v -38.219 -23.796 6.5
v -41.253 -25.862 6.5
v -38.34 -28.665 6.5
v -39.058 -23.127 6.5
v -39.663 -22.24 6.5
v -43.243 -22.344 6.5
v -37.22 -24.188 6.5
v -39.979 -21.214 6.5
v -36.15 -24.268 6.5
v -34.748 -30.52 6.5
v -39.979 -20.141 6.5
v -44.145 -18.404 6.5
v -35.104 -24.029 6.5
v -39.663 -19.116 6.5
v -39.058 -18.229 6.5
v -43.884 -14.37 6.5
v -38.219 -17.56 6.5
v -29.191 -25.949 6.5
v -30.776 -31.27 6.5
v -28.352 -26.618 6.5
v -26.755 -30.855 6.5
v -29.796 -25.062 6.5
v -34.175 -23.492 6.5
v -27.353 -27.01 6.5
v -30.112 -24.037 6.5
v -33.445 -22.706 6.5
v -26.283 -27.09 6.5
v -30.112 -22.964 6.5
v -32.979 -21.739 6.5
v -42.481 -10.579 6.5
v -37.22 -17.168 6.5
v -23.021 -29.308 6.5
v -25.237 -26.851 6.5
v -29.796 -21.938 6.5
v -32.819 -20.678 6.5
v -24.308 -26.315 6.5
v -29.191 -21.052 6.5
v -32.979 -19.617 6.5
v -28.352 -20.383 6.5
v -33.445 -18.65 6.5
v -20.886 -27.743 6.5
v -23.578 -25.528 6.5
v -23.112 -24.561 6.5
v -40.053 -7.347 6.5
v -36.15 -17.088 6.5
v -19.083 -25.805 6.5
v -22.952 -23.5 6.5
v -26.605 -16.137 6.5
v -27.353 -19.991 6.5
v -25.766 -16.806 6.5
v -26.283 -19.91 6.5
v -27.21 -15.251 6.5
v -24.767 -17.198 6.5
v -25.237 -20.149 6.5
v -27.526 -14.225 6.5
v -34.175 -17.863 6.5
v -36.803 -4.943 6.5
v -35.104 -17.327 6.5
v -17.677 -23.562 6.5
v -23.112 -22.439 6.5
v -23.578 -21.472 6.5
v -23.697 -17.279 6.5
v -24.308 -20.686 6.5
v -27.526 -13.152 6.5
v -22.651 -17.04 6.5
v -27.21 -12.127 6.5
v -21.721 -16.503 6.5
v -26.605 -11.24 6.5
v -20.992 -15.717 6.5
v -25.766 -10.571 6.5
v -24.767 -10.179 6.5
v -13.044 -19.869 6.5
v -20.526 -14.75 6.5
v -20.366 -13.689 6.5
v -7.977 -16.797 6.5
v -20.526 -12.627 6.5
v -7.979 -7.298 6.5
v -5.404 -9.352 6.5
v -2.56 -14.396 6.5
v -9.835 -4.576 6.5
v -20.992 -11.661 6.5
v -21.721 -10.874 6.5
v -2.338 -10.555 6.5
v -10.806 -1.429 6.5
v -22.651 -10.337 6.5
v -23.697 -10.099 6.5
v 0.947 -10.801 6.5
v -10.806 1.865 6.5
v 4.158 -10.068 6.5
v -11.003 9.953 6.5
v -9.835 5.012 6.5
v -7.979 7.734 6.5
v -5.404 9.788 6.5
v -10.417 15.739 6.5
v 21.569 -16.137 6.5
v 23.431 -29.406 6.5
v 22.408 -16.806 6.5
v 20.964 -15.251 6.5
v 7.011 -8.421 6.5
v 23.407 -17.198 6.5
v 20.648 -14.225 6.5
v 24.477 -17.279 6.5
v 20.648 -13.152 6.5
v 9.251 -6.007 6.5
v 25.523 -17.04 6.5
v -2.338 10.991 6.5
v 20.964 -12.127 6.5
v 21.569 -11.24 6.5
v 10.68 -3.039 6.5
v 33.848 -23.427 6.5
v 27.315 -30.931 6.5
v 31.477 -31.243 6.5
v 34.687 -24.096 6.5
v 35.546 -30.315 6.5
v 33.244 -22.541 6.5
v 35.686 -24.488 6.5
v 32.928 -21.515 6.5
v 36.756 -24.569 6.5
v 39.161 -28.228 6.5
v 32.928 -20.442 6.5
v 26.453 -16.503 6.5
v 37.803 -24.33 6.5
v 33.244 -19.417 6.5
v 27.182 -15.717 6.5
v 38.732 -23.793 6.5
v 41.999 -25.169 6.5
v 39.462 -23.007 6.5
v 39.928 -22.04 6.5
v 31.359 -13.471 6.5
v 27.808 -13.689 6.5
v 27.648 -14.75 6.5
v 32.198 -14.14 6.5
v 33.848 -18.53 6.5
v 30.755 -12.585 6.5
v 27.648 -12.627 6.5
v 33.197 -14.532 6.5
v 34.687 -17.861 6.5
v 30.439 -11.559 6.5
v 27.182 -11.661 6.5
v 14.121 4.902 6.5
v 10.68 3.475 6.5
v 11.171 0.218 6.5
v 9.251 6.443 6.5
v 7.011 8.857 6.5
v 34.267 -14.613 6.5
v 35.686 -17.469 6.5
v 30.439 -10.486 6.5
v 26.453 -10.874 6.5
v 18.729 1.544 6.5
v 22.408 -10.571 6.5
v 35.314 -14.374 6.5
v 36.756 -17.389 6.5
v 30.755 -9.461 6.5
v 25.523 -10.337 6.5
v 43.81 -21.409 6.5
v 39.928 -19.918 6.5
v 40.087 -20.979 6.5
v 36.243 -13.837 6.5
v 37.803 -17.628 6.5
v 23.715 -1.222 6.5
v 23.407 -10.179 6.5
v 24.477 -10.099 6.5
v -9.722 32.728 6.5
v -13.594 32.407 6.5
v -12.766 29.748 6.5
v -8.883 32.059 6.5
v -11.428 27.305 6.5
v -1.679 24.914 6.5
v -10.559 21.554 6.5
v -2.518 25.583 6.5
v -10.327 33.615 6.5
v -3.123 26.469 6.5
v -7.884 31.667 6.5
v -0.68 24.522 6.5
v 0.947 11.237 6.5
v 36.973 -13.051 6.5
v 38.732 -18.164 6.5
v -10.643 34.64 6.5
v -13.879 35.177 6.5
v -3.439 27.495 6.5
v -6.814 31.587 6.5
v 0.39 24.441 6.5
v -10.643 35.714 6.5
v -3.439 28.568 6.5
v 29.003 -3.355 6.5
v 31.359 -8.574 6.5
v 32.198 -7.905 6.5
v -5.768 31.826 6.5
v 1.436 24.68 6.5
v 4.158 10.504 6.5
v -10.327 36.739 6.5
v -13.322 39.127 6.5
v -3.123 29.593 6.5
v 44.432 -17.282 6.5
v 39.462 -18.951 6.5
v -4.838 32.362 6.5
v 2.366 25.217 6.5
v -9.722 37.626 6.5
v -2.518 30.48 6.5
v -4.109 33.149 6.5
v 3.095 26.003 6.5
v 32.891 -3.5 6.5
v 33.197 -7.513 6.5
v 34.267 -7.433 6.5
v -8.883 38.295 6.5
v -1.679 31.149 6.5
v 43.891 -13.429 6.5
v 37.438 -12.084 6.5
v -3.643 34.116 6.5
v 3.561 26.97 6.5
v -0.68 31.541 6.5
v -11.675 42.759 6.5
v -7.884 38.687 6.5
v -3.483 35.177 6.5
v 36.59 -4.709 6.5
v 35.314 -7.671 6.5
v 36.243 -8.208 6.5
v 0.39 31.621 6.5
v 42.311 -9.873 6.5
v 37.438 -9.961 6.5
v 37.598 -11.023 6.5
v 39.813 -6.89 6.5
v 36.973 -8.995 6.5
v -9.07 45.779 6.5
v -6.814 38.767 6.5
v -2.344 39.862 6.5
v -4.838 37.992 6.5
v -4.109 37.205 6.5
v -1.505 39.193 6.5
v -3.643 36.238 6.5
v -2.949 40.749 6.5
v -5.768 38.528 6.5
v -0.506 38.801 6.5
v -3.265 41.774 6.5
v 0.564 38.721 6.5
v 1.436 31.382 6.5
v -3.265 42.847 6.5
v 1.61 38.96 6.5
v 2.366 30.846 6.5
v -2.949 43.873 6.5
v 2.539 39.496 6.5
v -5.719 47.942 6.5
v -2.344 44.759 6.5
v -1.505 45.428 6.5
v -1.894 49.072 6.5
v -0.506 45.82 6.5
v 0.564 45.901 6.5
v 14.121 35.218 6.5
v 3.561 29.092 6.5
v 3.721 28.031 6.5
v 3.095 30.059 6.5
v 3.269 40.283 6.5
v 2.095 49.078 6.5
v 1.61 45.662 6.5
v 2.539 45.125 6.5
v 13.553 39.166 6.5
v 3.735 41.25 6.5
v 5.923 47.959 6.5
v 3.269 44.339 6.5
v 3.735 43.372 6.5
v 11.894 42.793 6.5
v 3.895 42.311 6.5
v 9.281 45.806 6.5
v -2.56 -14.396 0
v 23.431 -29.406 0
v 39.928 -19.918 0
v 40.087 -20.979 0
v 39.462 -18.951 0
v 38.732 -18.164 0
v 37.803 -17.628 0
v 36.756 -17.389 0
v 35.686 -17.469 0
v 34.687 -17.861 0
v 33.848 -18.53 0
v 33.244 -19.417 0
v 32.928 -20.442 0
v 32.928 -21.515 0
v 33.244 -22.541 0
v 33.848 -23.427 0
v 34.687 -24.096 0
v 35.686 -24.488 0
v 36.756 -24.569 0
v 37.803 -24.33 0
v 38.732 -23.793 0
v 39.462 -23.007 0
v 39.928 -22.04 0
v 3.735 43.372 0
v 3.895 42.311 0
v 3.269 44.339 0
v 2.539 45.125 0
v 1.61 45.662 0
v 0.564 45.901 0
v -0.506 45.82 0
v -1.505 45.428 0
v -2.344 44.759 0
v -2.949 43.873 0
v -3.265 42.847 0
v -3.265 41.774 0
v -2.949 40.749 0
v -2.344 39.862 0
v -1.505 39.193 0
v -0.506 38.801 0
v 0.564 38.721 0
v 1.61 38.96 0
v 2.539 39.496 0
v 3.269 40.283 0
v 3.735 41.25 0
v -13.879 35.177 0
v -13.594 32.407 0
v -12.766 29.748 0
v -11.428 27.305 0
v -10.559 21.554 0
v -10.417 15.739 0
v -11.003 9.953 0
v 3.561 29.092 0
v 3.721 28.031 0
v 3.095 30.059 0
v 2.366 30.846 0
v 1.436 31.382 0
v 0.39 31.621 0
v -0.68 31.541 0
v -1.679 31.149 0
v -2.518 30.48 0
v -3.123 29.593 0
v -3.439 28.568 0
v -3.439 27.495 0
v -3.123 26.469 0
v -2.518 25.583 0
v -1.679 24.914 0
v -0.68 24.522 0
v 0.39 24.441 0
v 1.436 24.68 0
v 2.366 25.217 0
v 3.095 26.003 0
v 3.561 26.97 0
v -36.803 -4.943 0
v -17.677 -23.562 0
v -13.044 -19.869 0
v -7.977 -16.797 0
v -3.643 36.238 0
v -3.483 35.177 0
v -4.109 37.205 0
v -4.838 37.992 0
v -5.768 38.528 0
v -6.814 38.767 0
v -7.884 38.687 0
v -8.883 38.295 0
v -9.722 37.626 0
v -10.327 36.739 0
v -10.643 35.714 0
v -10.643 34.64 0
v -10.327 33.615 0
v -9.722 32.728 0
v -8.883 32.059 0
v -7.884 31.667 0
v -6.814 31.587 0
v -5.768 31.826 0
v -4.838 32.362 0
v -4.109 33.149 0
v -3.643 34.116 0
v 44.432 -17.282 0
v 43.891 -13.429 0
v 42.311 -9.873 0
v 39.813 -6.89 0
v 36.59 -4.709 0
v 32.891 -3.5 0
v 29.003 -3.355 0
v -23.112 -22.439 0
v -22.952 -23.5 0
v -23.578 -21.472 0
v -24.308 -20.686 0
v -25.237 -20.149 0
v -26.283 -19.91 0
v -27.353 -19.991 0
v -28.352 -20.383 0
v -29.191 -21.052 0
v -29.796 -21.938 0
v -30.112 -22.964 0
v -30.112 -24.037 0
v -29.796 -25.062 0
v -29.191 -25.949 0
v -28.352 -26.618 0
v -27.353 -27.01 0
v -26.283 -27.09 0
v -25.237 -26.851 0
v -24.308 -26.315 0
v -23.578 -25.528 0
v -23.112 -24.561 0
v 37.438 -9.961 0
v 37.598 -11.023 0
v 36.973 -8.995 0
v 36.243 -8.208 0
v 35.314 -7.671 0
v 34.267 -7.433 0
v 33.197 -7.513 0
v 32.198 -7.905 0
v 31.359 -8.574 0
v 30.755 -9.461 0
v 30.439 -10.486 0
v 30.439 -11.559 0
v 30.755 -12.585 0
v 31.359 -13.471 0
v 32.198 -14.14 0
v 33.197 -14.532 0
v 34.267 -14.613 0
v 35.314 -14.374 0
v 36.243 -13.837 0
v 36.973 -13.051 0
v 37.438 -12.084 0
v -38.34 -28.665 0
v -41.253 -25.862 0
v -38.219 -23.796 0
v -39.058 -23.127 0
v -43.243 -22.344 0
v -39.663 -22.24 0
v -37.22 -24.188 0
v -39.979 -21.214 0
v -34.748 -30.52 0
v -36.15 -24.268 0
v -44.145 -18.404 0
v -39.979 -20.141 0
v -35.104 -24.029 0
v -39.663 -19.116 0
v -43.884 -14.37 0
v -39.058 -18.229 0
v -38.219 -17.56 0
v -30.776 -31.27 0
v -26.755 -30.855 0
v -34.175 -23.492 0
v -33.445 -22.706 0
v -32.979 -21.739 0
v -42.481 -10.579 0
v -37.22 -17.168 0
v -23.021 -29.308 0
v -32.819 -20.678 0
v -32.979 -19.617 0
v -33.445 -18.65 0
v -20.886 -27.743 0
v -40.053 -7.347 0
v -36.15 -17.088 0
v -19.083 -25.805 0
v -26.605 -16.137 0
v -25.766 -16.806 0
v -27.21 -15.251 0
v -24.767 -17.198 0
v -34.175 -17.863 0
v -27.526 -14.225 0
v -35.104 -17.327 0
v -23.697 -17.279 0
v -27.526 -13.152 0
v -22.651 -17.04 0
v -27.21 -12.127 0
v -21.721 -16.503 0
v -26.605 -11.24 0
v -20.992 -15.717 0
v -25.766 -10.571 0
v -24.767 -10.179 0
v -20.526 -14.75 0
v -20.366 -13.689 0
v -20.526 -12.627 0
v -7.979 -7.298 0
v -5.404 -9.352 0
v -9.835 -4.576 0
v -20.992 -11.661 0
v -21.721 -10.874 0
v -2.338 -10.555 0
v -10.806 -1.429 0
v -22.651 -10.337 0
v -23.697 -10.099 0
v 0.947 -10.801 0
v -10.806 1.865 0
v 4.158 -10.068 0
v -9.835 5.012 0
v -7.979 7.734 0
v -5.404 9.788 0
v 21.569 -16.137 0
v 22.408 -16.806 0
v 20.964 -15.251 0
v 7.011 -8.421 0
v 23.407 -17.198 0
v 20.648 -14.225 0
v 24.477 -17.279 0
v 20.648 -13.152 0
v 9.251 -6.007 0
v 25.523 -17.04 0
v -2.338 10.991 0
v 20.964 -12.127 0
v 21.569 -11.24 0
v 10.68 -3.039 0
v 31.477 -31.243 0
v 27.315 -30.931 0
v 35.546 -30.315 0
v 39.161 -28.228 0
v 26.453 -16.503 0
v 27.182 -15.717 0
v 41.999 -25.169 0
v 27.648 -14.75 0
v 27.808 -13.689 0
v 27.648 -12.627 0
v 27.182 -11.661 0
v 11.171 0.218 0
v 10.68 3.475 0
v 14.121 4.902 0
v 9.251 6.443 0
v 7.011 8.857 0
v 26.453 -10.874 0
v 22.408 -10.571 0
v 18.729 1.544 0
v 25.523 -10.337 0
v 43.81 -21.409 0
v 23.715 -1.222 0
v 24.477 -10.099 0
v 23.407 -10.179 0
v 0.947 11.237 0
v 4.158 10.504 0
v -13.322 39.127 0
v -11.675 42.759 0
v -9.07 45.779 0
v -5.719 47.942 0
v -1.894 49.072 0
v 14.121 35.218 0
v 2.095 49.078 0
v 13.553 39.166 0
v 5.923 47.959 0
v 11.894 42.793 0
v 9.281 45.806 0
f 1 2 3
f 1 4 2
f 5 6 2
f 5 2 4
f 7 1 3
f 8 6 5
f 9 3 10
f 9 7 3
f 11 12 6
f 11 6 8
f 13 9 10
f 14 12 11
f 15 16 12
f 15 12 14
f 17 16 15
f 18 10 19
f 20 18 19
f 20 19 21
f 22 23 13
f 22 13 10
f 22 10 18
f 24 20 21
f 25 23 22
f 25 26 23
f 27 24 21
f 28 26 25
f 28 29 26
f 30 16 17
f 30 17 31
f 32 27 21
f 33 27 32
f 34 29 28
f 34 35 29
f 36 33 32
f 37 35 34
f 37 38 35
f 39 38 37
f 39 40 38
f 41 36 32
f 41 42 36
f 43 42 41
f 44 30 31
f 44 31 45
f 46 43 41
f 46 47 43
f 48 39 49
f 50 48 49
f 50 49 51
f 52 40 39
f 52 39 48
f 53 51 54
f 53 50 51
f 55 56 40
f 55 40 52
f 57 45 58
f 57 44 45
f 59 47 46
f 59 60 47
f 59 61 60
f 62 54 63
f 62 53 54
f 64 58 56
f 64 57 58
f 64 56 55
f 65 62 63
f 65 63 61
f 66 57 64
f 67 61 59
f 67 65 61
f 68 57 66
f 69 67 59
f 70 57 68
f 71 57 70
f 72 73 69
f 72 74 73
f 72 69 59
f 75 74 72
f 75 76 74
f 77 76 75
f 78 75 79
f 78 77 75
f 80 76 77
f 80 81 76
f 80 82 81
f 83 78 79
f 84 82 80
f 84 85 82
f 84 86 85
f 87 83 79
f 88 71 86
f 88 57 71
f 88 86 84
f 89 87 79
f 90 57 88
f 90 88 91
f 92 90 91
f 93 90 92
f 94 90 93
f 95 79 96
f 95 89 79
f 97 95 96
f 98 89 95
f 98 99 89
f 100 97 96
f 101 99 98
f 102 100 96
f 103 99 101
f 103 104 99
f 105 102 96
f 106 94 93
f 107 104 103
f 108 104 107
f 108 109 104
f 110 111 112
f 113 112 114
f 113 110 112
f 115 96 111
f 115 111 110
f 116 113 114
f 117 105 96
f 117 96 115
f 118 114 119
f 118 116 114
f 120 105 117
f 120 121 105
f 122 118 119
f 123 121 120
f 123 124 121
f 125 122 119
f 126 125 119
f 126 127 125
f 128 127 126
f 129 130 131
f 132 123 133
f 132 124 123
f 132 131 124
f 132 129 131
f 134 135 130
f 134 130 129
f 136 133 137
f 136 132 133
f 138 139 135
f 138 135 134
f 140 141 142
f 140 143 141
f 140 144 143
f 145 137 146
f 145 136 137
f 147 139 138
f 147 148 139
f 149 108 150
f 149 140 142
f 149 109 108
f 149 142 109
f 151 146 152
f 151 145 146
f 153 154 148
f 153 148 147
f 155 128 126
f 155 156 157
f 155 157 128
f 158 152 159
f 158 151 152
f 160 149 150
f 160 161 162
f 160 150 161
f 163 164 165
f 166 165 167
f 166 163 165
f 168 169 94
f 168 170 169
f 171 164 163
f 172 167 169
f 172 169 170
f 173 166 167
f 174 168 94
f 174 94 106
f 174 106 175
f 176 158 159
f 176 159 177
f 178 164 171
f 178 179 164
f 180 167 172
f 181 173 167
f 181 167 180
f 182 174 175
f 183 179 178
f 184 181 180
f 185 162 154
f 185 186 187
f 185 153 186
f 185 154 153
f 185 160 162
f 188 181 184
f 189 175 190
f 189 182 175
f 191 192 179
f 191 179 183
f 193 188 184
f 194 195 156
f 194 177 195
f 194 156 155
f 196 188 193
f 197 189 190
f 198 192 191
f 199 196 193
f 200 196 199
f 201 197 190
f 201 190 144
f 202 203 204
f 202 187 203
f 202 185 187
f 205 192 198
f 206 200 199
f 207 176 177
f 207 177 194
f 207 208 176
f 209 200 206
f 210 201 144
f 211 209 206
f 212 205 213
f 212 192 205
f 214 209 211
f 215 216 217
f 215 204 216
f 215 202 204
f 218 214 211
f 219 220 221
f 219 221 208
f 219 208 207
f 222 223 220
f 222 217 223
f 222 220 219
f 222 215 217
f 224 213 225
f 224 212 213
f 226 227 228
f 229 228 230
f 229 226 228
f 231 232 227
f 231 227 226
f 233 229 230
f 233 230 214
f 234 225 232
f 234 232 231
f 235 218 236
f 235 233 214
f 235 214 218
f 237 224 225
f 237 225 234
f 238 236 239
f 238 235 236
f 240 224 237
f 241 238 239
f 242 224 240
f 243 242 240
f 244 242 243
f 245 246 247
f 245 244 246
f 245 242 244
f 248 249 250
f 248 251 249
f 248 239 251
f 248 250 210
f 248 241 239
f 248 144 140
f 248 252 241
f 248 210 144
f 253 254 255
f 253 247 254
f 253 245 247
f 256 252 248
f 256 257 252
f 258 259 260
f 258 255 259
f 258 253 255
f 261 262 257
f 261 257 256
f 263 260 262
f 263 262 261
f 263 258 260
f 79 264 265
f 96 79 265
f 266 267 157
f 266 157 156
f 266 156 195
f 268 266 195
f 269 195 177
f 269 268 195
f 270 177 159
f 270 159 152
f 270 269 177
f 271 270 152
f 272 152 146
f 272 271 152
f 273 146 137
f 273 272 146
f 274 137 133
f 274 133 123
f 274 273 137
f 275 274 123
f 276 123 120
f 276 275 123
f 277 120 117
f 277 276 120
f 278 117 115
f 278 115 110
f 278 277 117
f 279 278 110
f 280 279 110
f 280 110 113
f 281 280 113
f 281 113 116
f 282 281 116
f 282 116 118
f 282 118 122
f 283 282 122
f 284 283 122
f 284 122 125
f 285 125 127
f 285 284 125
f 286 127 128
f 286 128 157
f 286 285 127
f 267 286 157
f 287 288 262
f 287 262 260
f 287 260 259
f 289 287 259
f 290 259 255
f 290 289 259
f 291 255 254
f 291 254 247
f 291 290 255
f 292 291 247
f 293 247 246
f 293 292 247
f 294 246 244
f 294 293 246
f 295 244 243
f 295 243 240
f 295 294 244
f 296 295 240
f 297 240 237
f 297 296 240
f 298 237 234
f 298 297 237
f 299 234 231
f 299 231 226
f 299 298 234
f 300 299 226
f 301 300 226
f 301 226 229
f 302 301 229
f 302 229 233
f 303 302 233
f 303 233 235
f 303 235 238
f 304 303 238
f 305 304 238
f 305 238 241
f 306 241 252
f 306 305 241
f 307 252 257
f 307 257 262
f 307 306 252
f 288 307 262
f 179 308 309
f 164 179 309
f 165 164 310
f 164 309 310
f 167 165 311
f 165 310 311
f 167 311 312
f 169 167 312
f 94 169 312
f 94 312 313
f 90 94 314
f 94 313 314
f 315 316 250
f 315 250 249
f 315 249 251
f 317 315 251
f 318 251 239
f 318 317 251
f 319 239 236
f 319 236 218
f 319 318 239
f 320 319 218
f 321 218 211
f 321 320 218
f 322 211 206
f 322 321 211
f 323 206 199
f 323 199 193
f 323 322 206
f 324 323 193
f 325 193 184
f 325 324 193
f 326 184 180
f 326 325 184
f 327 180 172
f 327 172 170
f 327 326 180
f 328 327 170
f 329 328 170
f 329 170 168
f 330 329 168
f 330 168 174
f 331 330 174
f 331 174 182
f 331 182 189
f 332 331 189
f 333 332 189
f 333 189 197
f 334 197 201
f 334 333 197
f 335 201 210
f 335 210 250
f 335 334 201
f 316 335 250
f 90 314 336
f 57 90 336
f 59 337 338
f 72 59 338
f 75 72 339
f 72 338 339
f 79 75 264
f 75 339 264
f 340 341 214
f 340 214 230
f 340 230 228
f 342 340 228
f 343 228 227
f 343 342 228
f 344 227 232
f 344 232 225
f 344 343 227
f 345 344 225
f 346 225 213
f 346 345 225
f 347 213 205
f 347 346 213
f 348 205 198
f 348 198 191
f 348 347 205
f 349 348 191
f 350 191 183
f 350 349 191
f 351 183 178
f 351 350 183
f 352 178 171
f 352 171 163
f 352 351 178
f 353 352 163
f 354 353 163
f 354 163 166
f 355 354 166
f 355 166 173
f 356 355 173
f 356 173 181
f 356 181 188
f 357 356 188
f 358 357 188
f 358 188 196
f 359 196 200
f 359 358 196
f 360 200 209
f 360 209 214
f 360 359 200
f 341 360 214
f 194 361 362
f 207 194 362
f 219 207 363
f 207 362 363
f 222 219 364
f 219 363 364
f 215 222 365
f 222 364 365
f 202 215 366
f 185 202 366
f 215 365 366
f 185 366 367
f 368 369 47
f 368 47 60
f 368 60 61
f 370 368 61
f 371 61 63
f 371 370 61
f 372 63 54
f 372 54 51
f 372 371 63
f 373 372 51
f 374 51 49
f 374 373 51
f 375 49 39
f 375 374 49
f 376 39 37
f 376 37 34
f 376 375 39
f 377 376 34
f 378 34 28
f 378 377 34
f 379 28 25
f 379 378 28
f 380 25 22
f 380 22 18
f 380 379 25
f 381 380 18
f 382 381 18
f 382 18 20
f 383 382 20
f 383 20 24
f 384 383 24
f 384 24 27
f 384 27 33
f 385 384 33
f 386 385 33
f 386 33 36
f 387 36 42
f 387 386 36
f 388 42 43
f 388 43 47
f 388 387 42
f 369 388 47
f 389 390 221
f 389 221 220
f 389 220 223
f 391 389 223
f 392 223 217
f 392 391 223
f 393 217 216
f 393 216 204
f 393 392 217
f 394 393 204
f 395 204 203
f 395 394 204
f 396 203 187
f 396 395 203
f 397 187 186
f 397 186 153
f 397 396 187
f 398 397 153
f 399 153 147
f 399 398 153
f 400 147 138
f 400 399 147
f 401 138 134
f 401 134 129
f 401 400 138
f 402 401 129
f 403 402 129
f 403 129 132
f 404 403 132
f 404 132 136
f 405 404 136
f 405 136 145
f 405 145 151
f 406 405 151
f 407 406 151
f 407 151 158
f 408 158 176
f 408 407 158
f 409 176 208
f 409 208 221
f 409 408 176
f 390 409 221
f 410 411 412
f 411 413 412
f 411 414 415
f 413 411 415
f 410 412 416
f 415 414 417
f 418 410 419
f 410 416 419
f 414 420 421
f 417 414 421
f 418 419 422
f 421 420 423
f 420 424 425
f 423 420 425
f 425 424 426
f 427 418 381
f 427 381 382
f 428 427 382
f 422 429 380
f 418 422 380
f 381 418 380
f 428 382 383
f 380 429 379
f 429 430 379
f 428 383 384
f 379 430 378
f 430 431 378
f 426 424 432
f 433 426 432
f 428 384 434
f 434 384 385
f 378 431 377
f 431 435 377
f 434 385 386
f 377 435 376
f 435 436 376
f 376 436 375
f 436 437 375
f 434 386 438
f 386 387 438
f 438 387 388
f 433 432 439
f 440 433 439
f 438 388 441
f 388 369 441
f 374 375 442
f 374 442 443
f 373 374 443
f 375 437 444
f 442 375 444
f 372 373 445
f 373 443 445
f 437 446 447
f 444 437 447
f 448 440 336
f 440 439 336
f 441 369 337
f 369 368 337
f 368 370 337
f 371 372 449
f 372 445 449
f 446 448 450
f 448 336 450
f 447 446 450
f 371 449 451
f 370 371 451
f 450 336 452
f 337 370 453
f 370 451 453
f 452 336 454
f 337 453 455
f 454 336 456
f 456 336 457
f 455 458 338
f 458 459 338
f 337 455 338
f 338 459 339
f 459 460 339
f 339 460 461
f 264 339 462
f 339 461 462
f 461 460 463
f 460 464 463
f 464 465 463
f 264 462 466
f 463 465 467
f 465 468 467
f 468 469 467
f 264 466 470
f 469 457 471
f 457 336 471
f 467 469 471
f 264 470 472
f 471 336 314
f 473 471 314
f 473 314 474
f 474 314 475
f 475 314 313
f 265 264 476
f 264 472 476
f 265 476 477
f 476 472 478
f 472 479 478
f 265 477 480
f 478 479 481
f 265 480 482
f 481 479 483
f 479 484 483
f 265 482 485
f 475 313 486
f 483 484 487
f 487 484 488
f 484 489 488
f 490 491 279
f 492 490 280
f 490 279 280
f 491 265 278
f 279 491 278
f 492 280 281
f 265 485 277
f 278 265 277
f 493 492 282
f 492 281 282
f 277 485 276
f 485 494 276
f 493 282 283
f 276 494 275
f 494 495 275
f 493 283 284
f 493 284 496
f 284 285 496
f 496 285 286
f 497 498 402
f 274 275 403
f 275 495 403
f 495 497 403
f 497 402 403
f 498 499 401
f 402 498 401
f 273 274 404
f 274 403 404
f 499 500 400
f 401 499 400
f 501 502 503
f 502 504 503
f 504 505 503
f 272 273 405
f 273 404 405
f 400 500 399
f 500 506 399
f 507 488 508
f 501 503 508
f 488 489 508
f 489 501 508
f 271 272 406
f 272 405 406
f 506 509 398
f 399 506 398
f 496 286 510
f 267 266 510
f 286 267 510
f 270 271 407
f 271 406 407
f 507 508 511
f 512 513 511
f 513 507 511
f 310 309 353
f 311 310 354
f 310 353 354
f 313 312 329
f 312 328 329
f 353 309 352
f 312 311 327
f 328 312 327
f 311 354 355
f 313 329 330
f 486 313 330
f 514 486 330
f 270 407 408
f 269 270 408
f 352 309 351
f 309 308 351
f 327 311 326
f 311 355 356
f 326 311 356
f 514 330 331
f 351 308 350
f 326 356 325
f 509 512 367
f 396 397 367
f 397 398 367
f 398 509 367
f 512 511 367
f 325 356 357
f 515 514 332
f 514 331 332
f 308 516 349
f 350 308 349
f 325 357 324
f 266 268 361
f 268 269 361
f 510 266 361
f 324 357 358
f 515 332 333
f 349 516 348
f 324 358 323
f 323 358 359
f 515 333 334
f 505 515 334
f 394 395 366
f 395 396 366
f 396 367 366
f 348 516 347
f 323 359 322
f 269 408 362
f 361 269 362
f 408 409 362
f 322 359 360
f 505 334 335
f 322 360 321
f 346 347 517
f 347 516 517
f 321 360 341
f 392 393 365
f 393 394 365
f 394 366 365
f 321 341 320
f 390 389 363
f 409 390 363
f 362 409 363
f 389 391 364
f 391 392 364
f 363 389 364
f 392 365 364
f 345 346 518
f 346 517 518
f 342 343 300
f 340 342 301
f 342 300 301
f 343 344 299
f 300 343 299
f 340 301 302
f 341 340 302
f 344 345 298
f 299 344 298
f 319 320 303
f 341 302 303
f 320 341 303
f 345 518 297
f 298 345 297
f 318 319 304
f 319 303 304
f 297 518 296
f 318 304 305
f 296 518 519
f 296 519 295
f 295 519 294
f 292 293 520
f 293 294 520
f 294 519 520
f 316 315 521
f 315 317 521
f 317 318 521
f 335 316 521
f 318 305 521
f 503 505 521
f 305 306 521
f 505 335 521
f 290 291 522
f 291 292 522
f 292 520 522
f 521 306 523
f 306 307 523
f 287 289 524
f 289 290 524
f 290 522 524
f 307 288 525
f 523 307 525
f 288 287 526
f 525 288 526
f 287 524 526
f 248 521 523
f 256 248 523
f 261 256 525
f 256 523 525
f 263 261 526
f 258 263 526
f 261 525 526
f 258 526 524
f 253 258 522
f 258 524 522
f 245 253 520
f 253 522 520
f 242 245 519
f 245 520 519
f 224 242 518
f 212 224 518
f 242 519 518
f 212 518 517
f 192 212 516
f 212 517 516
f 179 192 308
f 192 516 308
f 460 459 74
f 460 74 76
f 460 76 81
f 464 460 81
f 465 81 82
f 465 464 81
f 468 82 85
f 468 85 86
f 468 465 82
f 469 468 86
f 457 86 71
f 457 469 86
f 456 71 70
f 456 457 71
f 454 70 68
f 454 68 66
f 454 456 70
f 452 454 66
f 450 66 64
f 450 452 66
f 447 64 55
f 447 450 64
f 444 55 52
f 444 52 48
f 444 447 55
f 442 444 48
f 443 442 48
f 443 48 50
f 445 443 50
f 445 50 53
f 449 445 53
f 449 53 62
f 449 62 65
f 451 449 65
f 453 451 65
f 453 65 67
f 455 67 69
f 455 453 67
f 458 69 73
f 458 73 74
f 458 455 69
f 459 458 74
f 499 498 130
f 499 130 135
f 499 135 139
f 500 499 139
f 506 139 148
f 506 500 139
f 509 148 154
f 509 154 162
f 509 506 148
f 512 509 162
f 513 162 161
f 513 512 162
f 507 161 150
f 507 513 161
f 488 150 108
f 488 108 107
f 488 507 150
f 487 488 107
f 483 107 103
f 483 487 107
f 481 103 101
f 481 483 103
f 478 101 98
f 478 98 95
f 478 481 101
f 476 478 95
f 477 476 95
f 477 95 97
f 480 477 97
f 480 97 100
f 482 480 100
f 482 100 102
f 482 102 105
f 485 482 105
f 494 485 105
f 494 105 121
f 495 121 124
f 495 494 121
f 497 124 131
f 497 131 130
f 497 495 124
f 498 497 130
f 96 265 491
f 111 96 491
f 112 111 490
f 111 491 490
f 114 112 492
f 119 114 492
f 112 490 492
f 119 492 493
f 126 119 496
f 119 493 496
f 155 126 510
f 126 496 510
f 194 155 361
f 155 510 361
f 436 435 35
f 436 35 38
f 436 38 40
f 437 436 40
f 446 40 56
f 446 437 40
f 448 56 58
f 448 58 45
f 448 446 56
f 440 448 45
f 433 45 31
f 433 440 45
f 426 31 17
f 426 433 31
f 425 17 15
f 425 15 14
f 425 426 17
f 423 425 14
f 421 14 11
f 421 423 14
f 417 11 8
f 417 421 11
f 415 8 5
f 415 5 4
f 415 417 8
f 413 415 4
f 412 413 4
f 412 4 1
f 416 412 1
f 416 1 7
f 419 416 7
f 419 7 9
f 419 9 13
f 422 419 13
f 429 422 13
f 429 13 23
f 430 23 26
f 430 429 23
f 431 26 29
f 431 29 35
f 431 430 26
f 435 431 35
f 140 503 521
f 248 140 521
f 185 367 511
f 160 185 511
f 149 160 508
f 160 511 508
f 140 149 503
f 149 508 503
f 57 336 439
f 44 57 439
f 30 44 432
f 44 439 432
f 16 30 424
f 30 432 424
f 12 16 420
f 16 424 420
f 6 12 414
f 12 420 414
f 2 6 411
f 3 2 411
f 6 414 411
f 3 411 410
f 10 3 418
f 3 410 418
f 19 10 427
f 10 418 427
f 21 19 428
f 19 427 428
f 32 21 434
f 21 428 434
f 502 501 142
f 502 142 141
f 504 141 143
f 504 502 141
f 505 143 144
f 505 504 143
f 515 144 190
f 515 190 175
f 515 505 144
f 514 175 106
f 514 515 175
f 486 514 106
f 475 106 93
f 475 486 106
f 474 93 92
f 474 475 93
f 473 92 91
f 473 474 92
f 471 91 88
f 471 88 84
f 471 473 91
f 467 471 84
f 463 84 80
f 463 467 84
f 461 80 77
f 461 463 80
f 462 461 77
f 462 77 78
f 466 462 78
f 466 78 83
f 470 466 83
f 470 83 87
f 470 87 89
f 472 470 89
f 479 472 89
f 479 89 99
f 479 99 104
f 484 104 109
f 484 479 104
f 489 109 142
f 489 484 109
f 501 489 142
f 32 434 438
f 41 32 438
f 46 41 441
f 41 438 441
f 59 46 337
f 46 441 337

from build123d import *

# Parameters (mm, degrees)
F0_R     = 3.6
F0_R_2   = 11.05
F1_DEPTH = 6.5


# Not quite as in the source:
# - a feature names something its author has since deleted; it is built from what else it names


with BuildPart() as f1:
    # F0 (on Top) → F1 (new body)
    with BuildSketch(Plane.XY):
        with BuildLine():
            ThreePointArc((-23.0209464524, -29.3076083822), (-19.9383676627, -26.8167802289), (-17.6773098575, -23.5619170235))
            ThreePointArc((-17.6773098575, -23.5619170235), (-20.4709038775, -26.3215082368), (-23.0209464524, -29.3076083822))
        make_face()
        with BuildLine():
            ThreePointArc((-2.5600533635, -14.3957456382), (-1.63787321, -14.0667717582), (-0.7089513801, -13.7573460272))
            ThreePointArc((-0.7089513801, -13.7573460272), (-3.7381834506, -13.2395644299), (-6.5814605839, -12.0733226612))
            Line((-6.5814605839, -12.0733226612), (-2.5600533635, -14.3957456382))
        make_face()
        with BuildLine():
            ThreePointArc((-0.7089513801, -13.7573460272), (3.2568779095, -13.4262355322), (6.9693155956, -11.9926238203))
            ThreePointArc((6.9693155956, -11.9926238203), (3.0926272048, -12.7115843783), (-0.7089513801, -13.7573460272))
        make_face()
        with BuildLine():
            ThreePointArc((29.002813969, -3.3554863963), (22.1605329653, -5.9872334975), (17.5863384821, -11.7160769207))
            ThreePointArc((17.5863384821, -11.7160769207), (17.1389450218, -21.6742013703), (23.4307313902, -29.4058136055))
            ThreePointArc((23.4307313902, -29.4058136055), (37.4314802249, -29.4071108103), (44.4322291397, -17.282322802))
            ThreePointArc((44.4322291397, -17.282322802), (39.8127458528, -6.8897337985), (29.002813969, -3.3554863963))
        make_face()
        with Locations((24.2079713773, -13.6886037443)):
            Circle(F0_R, mode=Mode.SUBTRACT)
        with Locations((36.4874702709, -20.9787380615)):
            Circle(F0_R, mode=Mode.SUBTRACT)
        with Locations((33.9983616409, -11.0225966846)):
            Circle(F0_R, mode=Mode.SUBTRACT)
        with BuildLine():
            ThreePointArc((-23.0209464524, -29.3076083822), (-20.4709038775, -26.3215082368), (-17.6773098575, -23.5619170235))
            ThreePointArc((-17.6773098575, -23.5619170235), (-16.5669328393, -20.5090534106), (-16.1900430763, -17.2824658218))
            ThreePointArc((-16.1900430763, -17.2824658218), (-16.8601676515, -13.0029306649), (-18.8063889562, -9.1330843193))
            ThreePointArc((-18.8063889562, -9.1330843193), (-27.0153338433, -3.6471725985), (-36.8032431016, -4.9428716054))
            ThreePointArc((-36.8032431016, -4.9428716054), (-42.3755818337, -24.1754075155), (-23.0209464524, -29.3076083822))
        make_face()
        with Locations((-26.552398323, -23.5003339555)):
            Circle(F0_R, mode=Mode.SUBTRACT)
        with Locations((-36.419223994, -20.6778945734)):
            Circle(F0_R, mode=Mode.SUBTRACT)
        with Locations((-23.9660330315, -13.6886037443)):
            Circle(F0_R, mode=Mode.SUBTRACT)
        with BuildLine():
            ThreePointArc((-11.3063452022, 8.3060793433), (-9.4777201208, 10.4094594589), (-7.2686697166, 12.1089222888))
            Line((-7.2686697166, 12.1089222888), (-11.0034872924, 9.9526243561))
            ThreePointArc((-11.0034872924, 9.9526243561), (-11.1474831305, 9.1279846364), (-11.3063452022, 8.3060793433))
        make_face()
        with BuildLine():
            ThreePointArc((-13.8745275017, -0.137033899), (-12.3890775486, 4.023274448), (-11.3063452022, 8.3060793433))
            ThreePointArc((-11.3063452022, 8.3060793433), (-13.2731105164, 4.292175001), (-13.8745275017, -0.137033899))
        make_face()
        with BuildLine():
            ThreePointArc((6.7990177159, 12.5226532313), (9.6860598983, 9.0919172063), (12.891022892, 5.9561279205))
            ThreePointArc((12.891022892, 5.9561279205), (10.3843499056, 9.7397463301), (6.7990177159, 12.5226532313))
        make_face()
        with BuildLine():
            ThreePointArc((12.891022892, 5.9561279205), (13.810029624, 3.1522495359), (14.1209691729, 0.2180334624))
            Line((14.1209691729, 0.2180334624), (14.1209691729, 4.9018602452))
            ThreePointArc((14.1209691729, 4.9018602452), (13.5013908187, 5.4236214762), (12.891022892, 5.9561279205))
        make_face()
        with BuildLine():
            ThreePointArc((-11.4281301493, 27.3048605939), (-12.4782019744, 31.2955370079), (-13.8789707842, 35.1770310271))
            ThreePointArc((-13.8789707842, 35.1770310271), (-13.2461965273, 31.0564374771), (-11.4281301493, 27.3048605939))
        make_face()
        with BuildLine():
            ThreePointArc((6.7990177159, 12.5226532313), (10.3843499056, 9.7397463301), (12.891022892, 5.9561279205))
            ThreePointArc((12.891022892, 5.9561279205), (13.5013908187, 5.4236214762), (14.1209691729, 4.9018602452))
            Line((14.1209691729, 4.9018602452), (14.1209691729, 35.2180334624))
            ThreePointArc((14.1209691729, 35.2180334624), (4.2629861628, 21.8447879604), (-11.4281301493, 27.3048605939))
            ThreePointArc((-11.4281301493, 27.3048605939), (-10.3964763758, 18.6487931257), (-11.0034872924, 9.9526243561))
            Line((-11.0034872924, 9.9526243561), (-7.2686697166, 12.1089222888))
            ThreePointArc((-7.2686697166, 12.1089222888), (-0.2905931292, 14.2119827431), (6.7990177159, 12.5226532313))
        make_face()
        with BuildLine():
            ThreePointArc((6.9693155956, -11.9926238203), (12.2014668844, -6.8573870227), (14.1209691729, 0.2180334624))
            ThreePointArc((14.1209691729, 0.2180334624), (13.810029624, 3.1522495359), (12.891022892, 5.9561279205))
            ThreePointArc((12.891022892, 5.9561279205), (9.6860598983, 9.0919172063), (6.7990177159, 12.5226532313))
            ThreePointArc((6.7990177159, 12.5226532313), (-0.2905931292, 14.2119827431), (-7.2686697166, 12.1089222888))
            ThreePointArc((-7.2686697166, 12.1089222888), (-9.4777201208, 10.4094594589), (-11.3063452022, 8.3060793433))
            ThreePointArc((-11.3063452022, 8.3060793433), (-12.3890775486, 4.023274448), (-13.8745275017, -0.137033899))
            ThreePointArc((-13.8745275017, -0.137033899), (-11.8255695306, -7.0812961649), (-6.5814605839, -12.0733226612))
            ThreePointArc((-6.5814605839, -12.0733226612), (-3.7381834506, -13.2395644299), (-0.7089513801, -13.7573460272))
            ThreePointArc((-0.7089513801, -13.7573460272), (3.0926272048, -12.7115843783), (6.9693155956, -11.9926238203))
        make_face()
        with Locations((0.1209691729, 0.2180334624)):
            Circle(F0_R_2, mode=Mode.SUBTRACT)
        with BuildLine():
            ThreePointArc((-13.8745275017, -0.137033899), (-13.2731105164, 4.292175001), (-11.3063452022, 8.3060793433))
            ThreePointArc((-11.3063452022, 8.3060793433), (-11.1474831305, 9.1279846364), (-11.0034872924, 9.9526243561))
            Line((-11.0034872924, 9.9526243561), (-36.8032431016, -4.9428716054))
            ThreePointArc((-36.8032431016, -4.9428716054), (-27.0153338433, -3.6471725985), (-18.8063889562, -9.1330843193))
            ThreePointArc((-18.8063889562, -9.1330843193), (-16.0908458514, -4.7719029024), (-13.8745275017, -0.137033899))
        make_face()
        with BuildLine():
            Line((-2.5600533635, -14.3957456382), (-6.5814605839, -12.0733226612))
            ThreePointArc((-6.5814605839, -12.0733226612), (-11.8255695306, -7.0812961649), (-13.8745275017, -0.137033899))
            ThreePointArc((-13.8745275017, -0.137033899), (-16.0908458514, -4.7719029024), (-18.8063889562, -9.1330843193))
            ThreePointArc((-18.8063889562, -9.1330843193), (-16.8601676515, -13.0029306649), (-16.1900430763, -17.2824658218))
            ThreePointArc((-16.1900430763, -17.2824658218), (-16.5669328393, -20.5090534106), (-17.6773098575, -23.5619170235))
            ThreePointArc((-17.6773098575, -23.5619170235), (-10.5596558993, -18.2515569705), (-2.5600533635, -14.3957456382))
        make_face()
        with BuildLine():
            ThreePointArc((17.5863384821, -11.7160769207), (12.2698816763, -11.5493167715), (6.9693155956, -11.9926238203))
            ThreePointArc((6.9693155956, -11.9926238203), (3.2568779095, -13.4262355322), (-0.7089513801, -13.7573460272))
            ThreePointArc((-0.7089513801, -13.7573460272), (-1.63787321, -14.0667717582), (-2.5600533635, -14.3957456382))
            Line((-2.5600533635, -14.3957456382), (23.4307313902, -29.4058136055))
            ThreePointArc((23.4307313902, -29.4058136055), (17.1389450218, -21.6742013703), (17.5863384821, -11.7160769207))
        make_face()
        with BuildLine():
            Line((14.1209691729, 4.9018602452), (14.1209691729, 0.2180334624))
            ThreePointArc((14.1209691729, 0.2180334624), (12.2014668844, -6.8573870227), (6.9693155956, -11.9926238203))
            ThreePointArc((6.9693155956, -11.9926238203), (12.2698816763, -11.5493167715), (17.5863384821, -11.7160769207))
            ThreePointArc((17.5863384821, -11.7160769207), (22.1605329653, -5.9872334975), (29.002813969, -3.3554863963))
            ThreePointArc((29.002813969, -3.3554863963), (21.1797290943, 0.0844326658), (14.1209691729, 4.9018602452))
        make_face()
        with BuildLine():
            ThreePointArc((-11.4281301493, 27.3048605939), (4.2629861628, 21.8447879604), (14.1209691729, 35.2180334624))
            ThreePointArc((14.1209691729, 35.2180334624), (0.1004679333, 49.2180184516), (-13.8789707842, 35.1770310271))
            ThreePointArc((-13.8789707842, 35.1770310271), (-12.4782019744, 31.2955370079), (-11.4281301493, 27.3048605939))
        make_face()
        with Locations((0.1209691729, 28.0313078757)):
            Circle(F0_R, mode=Mode.SUBTRACT)
        with Locations((-7.0830557993, 35.1770310271)):
            Circle(F0_R, mode=Mode.SUBTRACT)
        with Locations((0.2946612417, 42.3107330219)):
            Circle(F0_R, mode=Mode.SUBTRACT)
    extrude(amount=F1_DEPTH)


solid = f1.part
